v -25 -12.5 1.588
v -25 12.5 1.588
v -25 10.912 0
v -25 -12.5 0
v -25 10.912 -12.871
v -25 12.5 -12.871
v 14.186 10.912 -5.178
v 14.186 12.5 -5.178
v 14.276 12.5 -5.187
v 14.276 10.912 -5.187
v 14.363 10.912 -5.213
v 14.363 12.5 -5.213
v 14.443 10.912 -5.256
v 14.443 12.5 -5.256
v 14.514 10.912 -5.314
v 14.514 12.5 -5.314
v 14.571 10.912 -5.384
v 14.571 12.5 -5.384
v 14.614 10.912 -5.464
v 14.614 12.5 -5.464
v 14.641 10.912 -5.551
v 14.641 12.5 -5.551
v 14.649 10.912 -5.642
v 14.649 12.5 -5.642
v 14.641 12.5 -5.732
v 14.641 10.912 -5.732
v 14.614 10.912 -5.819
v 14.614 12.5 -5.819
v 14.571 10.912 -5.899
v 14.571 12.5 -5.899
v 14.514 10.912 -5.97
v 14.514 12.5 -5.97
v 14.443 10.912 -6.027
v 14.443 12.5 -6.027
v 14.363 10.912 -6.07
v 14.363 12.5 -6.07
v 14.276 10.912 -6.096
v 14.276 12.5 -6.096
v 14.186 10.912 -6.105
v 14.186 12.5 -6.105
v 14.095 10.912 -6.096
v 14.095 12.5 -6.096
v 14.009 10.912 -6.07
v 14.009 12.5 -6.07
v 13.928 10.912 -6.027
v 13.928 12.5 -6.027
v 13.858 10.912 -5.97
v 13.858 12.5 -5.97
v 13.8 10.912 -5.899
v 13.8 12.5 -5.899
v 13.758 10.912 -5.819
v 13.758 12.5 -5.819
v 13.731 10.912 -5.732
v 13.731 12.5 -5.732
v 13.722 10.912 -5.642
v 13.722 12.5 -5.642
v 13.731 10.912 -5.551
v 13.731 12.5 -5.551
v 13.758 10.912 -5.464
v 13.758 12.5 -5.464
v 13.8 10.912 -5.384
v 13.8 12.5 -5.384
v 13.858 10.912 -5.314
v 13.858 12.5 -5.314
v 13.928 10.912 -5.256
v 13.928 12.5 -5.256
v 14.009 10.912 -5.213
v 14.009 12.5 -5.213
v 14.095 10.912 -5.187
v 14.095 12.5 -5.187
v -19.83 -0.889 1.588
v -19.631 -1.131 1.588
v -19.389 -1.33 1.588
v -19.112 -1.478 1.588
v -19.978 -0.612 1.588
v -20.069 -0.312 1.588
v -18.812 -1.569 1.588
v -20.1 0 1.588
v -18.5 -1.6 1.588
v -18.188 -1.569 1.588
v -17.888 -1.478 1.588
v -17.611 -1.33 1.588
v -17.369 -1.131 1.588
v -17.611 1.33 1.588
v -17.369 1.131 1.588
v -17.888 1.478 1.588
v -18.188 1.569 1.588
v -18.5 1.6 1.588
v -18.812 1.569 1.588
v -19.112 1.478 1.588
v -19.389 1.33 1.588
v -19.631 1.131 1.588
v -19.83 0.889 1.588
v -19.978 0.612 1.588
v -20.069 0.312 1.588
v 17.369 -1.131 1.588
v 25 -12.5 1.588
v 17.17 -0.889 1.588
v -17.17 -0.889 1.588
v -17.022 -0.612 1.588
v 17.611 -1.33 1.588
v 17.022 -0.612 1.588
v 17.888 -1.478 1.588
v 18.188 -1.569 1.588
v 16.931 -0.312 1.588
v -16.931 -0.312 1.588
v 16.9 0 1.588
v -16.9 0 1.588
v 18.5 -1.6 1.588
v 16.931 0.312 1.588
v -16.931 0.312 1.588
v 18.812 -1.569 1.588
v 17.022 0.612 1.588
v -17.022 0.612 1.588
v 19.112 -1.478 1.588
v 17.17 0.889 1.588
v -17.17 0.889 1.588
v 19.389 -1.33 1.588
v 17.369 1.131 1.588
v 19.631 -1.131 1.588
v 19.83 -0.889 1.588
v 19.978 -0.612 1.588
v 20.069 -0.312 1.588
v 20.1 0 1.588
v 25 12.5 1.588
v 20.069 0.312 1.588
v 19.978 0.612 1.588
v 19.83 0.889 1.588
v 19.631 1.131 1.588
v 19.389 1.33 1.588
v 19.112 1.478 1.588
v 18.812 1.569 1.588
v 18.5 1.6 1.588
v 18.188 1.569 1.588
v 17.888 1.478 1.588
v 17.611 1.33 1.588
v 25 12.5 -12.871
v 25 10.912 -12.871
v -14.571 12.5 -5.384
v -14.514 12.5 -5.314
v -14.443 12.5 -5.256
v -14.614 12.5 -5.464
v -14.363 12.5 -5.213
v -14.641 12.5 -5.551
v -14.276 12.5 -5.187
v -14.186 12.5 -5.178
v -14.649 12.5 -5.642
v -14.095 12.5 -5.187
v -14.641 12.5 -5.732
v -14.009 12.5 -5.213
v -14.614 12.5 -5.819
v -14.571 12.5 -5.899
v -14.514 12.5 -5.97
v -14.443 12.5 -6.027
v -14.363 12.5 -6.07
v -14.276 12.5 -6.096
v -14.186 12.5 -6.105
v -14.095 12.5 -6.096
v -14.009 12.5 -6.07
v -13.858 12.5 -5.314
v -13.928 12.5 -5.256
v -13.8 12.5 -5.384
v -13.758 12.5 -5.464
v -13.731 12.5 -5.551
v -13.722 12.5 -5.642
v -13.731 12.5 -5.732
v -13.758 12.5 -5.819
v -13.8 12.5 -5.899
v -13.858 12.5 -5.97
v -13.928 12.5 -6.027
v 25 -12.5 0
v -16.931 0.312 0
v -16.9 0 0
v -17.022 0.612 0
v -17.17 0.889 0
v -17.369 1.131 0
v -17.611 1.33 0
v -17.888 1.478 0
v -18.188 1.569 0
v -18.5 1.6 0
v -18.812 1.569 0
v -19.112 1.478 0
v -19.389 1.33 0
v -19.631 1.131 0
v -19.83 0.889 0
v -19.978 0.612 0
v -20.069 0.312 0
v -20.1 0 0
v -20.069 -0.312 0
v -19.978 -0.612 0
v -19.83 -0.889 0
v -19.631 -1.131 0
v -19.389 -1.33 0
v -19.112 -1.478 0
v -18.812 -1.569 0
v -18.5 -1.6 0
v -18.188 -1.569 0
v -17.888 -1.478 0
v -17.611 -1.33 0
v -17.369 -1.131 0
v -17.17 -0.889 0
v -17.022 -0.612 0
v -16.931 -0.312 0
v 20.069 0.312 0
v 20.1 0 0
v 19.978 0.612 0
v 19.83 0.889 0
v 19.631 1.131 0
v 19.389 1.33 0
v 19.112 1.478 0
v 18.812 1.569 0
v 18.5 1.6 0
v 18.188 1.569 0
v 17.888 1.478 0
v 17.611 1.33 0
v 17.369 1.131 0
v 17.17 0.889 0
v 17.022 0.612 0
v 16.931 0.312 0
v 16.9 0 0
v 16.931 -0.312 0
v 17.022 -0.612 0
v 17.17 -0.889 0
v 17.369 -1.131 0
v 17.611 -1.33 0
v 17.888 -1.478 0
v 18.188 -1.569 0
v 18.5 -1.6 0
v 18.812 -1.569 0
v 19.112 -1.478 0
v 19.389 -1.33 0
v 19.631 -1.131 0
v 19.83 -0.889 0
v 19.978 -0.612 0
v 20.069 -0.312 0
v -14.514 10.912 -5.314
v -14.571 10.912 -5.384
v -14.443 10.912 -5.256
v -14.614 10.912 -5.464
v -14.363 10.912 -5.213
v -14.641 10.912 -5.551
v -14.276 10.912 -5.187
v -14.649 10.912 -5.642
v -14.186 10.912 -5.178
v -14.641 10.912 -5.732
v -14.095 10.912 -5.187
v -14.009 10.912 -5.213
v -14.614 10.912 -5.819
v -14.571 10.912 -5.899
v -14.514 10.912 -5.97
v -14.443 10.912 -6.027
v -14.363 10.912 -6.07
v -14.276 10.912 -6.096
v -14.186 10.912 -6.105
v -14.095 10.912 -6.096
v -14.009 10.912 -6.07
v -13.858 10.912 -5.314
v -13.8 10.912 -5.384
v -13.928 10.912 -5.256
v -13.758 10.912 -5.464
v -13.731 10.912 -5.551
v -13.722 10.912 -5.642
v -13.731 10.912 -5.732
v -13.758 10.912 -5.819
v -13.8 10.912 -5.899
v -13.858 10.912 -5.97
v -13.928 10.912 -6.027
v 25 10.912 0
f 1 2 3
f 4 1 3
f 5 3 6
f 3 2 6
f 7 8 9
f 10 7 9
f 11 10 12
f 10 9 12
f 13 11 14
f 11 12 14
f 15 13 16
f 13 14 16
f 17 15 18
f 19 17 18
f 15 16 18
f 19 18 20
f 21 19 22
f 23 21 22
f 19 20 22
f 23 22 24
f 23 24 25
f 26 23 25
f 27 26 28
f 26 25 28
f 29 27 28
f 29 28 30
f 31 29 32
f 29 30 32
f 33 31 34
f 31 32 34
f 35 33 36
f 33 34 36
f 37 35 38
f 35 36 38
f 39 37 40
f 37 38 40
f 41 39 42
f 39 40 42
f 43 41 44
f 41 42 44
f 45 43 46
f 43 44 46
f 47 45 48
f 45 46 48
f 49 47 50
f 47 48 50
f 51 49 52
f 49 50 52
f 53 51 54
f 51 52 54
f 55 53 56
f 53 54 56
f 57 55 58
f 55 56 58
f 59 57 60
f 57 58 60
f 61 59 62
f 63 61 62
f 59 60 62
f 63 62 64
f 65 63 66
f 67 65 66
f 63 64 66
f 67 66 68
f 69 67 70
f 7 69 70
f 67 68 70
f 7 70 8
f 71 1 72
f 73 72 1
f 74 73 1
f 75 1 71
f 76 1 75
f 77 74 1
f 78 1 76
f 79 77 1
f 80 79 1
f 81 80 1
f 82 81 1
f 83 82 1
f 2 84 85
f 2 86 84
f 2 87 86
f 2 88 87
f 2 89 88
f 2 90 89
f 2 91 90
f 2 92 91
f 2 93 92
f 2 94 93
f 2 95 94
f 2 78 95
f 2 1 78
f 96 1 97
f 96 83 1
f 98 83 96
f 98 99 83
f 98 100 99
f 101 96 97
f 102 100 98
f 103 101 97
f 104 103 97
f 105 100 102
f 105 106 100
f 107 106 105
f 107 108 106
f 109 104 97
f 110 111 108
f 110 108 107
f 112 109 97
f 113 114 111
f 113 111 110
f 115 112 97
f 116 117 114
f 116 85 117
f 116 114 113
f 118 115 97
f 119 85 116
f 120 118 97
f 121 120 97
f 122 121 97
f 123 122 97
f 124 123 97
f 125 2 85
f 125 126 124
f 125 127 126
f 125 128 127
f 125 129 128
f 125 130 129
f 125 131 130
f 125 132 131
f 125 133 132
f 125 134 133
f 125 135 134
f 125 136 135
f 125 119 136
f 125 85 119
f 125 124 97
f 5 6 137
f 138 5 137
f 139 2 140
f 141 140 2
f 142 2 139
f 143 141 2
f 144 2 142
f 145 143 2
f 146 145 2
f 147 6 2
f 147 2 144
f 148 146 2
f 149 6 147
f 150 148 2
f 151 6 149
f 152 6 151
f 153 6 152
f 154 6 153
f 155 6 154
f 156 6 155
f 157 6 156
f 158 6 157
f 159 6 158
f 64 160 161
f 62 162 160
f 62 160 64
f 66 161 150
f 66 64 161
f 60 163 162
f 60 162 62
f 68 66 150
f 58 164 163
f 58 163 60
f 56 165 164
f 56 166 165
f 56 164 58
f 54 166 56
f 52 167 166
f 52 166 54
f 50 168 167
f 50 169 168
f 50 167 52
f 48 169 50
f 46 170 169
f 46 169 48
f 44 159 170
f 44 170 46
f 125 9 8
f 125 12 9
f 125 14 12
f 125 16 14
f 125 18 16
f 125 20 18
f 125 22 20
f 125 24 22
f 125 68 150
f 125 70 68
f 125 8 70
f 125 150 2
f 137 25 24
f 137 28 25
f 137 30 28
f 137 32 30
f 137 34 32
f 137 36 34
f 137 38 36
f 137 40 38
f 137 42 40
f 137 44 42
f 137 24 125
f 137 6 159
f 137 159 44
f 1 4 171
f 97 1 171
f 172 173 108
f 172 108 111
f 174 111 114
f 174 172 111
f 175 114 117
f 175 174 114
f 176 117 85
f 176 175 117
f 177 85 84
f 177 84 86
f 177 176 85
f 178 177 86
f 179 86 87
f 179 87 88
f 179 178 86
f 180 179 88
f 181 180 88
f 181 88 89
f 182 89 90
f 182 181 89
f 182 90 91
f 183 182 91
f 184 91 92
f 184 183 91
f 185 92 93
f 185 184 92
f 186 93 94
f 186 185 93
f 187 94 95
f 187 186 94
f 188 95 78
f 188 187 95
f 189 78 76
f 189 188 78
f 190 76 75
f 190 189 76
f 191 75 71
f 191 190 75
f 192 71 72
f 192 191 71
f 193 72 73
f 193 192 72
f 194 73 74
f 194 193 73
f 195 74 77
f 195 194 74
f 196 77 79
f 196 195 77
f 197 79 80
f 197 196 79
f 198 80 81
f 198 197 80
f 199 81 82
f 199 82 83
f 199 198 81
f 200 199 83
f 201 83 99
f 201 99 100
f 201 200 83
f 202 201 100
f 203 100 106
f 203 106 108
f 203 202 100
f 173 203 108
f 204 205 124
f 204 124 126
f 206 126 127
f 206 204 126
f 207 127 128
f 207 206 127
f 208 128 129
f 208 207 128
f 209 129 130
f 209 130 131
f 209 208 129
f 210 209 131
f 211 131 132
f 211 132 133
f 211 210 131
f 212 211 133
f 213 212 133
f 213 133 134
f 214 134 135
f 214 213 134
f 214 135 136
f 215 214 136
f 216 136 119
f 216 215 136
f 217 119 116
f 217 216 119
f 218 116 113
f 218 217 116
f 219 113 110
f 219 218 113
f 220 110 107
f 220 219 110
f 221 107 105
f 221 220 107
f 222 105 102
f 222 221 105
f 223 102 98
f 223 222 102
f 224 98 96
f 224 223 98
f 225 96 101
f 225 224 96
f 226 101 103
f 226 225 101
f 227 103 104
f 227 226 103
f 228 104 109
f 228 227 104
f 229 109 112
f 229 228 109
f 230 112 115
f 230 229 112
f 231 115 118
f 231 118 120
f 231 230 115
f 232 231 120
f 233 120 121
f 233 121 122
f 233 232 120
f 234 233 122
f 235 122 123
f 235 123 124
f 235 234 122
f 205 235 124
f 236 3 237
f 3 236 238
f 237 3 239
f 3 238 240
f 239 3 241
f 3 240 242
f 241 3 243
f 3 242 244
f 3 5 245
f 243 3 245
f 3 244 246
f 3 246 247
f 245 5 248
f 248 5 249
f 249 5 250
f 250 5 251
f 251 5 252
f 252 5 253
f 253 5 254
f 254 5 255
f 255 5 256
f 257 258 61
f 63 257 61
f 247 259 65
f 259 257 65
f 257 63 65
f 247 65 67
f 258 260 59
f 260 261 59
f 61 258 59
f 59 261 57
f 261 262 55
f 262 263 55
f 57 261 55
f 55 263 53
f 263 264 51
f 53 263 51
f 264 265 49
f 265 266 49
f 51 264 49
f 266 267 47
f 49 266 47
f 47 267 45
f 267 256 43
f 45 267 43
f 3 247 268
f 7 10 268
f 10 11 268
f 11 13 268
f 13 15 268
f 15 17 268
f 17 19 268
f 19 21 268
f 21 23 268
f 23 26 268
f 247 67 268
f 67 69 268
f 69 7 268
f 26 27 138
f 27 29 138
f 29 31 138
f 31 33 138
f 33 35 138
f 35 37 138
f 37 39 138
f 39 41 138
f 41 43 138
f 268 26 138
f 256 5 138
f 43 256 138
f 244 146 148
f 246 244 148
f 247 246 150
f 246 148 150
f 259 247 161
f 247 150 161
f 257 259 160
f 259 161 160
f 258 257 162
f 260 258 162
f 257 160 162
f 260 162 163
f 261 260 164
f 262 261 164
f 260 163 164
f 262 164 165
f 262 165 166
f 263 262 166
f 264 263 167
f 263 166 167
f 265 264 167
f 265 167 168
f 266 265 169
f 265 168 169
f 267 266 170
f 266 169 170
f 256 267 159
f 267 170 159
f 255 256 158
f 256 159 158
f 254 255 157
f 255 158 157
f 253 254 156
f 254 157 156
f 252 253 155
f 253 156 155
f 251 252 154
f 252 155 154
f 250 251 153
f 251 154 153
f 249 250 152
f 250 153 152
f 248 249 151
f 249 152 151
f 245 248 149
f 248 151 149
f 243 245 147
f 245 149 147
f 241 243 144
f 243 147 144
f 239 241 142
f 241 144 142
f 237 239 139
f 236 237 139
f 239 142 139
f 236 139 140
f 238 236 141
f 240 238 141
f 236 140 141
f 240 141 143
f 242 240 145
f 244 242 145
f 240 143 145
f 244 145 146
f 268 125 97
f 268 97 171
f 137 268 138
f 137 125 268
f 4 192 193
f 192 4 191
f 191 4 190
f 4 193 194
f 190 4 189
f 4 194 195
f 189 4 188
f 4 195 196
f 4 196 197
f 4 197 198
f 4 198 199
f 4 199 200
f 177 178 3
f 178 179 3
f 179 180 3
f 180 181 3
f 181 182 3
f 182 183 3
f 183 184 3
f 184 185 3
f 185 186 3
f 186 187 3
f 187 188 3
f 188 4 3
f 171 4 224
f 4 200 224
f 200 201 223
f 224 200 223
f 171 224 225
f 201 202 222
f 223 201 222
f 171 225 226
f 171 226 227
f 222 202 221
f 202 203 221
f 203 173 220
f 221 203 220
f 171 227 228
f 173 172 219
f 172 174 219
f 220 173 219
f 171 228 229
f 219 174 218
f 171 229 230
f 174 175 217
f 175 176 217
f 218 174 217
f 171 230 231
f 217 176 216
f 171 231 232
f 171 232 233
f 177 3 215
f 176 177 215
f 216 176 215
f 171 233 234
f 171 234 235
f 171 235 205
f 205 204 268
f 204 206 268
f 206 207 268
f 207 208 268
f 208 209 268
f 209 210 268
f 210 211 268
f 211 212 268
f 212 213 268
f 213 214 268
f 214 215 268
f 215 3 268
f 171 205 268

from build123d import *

# Parameters (mm, degrees)
SKETCH1_W           = 50
SKETCH1_H           = 25
SKETCH1_R           = 1.6
BOSS_EXTRUDE1_DEPTH = 1.5875
SKETCH2_W           = 50
SKETCH2_H           = 12.870978344
BOSS_EXTRUDE2_DEPTH = 1.5875
SKETCH3_R           = 0.46355
CUT_EXTRUDE1_DEPTH  = 1.5875


with BuildPart() as part:
    # Sketch1 → Boss-Extrude1 (new body)
    with BuildSketch(Plane.XY):
        Rectangle(SKETCH1_W, SKETCH1_H)
        with Locations((-18.5, 0)):
            Circle(SKETCH1_R, mode=Mode.SUBTRACT)
        with Locations((18.5, 0)):
            Circle(SKETCH1_R, mode=Mode.SUBTRACT)
    extrude(amount=BOSS_EXTRUDE1_DEPTH)

    # Sketch2 → Boss-Extrude2 (add)
    with BuildSketch(Plane(origin=(0, 12.5, 0), x_dir=(1, 0, 0), z_dir=(0, 1, 0))):
        with Locations((0, 6.435489172)):
            Rectangle(SKETCH2_W, SKETCH2_H)
    extrude(amount=-BOSS_EXTRUDE2_DEPTH)

    # Sketch3 → Cut-Extrude1 (cut)
    with BuildSketch(Plane(origin=(0, 12.5, 0), x_dir=(1, 0, 0), z_dir=(0, 1, 0))):
        with Locations(Location((-14.1859, 5.641739172, 0), (0, 0, 270))):
            Circle(SKETCH3_R)
        with Locations(Location((14.1859, 5.641739172, 0), (0, 0, 270))):
            Circle(SKETCH3_R)
    extrude(amount=-CUT_EXTRUDE1_DEPTH, mode=Mode.SUBTRACT)


solid = part.part
